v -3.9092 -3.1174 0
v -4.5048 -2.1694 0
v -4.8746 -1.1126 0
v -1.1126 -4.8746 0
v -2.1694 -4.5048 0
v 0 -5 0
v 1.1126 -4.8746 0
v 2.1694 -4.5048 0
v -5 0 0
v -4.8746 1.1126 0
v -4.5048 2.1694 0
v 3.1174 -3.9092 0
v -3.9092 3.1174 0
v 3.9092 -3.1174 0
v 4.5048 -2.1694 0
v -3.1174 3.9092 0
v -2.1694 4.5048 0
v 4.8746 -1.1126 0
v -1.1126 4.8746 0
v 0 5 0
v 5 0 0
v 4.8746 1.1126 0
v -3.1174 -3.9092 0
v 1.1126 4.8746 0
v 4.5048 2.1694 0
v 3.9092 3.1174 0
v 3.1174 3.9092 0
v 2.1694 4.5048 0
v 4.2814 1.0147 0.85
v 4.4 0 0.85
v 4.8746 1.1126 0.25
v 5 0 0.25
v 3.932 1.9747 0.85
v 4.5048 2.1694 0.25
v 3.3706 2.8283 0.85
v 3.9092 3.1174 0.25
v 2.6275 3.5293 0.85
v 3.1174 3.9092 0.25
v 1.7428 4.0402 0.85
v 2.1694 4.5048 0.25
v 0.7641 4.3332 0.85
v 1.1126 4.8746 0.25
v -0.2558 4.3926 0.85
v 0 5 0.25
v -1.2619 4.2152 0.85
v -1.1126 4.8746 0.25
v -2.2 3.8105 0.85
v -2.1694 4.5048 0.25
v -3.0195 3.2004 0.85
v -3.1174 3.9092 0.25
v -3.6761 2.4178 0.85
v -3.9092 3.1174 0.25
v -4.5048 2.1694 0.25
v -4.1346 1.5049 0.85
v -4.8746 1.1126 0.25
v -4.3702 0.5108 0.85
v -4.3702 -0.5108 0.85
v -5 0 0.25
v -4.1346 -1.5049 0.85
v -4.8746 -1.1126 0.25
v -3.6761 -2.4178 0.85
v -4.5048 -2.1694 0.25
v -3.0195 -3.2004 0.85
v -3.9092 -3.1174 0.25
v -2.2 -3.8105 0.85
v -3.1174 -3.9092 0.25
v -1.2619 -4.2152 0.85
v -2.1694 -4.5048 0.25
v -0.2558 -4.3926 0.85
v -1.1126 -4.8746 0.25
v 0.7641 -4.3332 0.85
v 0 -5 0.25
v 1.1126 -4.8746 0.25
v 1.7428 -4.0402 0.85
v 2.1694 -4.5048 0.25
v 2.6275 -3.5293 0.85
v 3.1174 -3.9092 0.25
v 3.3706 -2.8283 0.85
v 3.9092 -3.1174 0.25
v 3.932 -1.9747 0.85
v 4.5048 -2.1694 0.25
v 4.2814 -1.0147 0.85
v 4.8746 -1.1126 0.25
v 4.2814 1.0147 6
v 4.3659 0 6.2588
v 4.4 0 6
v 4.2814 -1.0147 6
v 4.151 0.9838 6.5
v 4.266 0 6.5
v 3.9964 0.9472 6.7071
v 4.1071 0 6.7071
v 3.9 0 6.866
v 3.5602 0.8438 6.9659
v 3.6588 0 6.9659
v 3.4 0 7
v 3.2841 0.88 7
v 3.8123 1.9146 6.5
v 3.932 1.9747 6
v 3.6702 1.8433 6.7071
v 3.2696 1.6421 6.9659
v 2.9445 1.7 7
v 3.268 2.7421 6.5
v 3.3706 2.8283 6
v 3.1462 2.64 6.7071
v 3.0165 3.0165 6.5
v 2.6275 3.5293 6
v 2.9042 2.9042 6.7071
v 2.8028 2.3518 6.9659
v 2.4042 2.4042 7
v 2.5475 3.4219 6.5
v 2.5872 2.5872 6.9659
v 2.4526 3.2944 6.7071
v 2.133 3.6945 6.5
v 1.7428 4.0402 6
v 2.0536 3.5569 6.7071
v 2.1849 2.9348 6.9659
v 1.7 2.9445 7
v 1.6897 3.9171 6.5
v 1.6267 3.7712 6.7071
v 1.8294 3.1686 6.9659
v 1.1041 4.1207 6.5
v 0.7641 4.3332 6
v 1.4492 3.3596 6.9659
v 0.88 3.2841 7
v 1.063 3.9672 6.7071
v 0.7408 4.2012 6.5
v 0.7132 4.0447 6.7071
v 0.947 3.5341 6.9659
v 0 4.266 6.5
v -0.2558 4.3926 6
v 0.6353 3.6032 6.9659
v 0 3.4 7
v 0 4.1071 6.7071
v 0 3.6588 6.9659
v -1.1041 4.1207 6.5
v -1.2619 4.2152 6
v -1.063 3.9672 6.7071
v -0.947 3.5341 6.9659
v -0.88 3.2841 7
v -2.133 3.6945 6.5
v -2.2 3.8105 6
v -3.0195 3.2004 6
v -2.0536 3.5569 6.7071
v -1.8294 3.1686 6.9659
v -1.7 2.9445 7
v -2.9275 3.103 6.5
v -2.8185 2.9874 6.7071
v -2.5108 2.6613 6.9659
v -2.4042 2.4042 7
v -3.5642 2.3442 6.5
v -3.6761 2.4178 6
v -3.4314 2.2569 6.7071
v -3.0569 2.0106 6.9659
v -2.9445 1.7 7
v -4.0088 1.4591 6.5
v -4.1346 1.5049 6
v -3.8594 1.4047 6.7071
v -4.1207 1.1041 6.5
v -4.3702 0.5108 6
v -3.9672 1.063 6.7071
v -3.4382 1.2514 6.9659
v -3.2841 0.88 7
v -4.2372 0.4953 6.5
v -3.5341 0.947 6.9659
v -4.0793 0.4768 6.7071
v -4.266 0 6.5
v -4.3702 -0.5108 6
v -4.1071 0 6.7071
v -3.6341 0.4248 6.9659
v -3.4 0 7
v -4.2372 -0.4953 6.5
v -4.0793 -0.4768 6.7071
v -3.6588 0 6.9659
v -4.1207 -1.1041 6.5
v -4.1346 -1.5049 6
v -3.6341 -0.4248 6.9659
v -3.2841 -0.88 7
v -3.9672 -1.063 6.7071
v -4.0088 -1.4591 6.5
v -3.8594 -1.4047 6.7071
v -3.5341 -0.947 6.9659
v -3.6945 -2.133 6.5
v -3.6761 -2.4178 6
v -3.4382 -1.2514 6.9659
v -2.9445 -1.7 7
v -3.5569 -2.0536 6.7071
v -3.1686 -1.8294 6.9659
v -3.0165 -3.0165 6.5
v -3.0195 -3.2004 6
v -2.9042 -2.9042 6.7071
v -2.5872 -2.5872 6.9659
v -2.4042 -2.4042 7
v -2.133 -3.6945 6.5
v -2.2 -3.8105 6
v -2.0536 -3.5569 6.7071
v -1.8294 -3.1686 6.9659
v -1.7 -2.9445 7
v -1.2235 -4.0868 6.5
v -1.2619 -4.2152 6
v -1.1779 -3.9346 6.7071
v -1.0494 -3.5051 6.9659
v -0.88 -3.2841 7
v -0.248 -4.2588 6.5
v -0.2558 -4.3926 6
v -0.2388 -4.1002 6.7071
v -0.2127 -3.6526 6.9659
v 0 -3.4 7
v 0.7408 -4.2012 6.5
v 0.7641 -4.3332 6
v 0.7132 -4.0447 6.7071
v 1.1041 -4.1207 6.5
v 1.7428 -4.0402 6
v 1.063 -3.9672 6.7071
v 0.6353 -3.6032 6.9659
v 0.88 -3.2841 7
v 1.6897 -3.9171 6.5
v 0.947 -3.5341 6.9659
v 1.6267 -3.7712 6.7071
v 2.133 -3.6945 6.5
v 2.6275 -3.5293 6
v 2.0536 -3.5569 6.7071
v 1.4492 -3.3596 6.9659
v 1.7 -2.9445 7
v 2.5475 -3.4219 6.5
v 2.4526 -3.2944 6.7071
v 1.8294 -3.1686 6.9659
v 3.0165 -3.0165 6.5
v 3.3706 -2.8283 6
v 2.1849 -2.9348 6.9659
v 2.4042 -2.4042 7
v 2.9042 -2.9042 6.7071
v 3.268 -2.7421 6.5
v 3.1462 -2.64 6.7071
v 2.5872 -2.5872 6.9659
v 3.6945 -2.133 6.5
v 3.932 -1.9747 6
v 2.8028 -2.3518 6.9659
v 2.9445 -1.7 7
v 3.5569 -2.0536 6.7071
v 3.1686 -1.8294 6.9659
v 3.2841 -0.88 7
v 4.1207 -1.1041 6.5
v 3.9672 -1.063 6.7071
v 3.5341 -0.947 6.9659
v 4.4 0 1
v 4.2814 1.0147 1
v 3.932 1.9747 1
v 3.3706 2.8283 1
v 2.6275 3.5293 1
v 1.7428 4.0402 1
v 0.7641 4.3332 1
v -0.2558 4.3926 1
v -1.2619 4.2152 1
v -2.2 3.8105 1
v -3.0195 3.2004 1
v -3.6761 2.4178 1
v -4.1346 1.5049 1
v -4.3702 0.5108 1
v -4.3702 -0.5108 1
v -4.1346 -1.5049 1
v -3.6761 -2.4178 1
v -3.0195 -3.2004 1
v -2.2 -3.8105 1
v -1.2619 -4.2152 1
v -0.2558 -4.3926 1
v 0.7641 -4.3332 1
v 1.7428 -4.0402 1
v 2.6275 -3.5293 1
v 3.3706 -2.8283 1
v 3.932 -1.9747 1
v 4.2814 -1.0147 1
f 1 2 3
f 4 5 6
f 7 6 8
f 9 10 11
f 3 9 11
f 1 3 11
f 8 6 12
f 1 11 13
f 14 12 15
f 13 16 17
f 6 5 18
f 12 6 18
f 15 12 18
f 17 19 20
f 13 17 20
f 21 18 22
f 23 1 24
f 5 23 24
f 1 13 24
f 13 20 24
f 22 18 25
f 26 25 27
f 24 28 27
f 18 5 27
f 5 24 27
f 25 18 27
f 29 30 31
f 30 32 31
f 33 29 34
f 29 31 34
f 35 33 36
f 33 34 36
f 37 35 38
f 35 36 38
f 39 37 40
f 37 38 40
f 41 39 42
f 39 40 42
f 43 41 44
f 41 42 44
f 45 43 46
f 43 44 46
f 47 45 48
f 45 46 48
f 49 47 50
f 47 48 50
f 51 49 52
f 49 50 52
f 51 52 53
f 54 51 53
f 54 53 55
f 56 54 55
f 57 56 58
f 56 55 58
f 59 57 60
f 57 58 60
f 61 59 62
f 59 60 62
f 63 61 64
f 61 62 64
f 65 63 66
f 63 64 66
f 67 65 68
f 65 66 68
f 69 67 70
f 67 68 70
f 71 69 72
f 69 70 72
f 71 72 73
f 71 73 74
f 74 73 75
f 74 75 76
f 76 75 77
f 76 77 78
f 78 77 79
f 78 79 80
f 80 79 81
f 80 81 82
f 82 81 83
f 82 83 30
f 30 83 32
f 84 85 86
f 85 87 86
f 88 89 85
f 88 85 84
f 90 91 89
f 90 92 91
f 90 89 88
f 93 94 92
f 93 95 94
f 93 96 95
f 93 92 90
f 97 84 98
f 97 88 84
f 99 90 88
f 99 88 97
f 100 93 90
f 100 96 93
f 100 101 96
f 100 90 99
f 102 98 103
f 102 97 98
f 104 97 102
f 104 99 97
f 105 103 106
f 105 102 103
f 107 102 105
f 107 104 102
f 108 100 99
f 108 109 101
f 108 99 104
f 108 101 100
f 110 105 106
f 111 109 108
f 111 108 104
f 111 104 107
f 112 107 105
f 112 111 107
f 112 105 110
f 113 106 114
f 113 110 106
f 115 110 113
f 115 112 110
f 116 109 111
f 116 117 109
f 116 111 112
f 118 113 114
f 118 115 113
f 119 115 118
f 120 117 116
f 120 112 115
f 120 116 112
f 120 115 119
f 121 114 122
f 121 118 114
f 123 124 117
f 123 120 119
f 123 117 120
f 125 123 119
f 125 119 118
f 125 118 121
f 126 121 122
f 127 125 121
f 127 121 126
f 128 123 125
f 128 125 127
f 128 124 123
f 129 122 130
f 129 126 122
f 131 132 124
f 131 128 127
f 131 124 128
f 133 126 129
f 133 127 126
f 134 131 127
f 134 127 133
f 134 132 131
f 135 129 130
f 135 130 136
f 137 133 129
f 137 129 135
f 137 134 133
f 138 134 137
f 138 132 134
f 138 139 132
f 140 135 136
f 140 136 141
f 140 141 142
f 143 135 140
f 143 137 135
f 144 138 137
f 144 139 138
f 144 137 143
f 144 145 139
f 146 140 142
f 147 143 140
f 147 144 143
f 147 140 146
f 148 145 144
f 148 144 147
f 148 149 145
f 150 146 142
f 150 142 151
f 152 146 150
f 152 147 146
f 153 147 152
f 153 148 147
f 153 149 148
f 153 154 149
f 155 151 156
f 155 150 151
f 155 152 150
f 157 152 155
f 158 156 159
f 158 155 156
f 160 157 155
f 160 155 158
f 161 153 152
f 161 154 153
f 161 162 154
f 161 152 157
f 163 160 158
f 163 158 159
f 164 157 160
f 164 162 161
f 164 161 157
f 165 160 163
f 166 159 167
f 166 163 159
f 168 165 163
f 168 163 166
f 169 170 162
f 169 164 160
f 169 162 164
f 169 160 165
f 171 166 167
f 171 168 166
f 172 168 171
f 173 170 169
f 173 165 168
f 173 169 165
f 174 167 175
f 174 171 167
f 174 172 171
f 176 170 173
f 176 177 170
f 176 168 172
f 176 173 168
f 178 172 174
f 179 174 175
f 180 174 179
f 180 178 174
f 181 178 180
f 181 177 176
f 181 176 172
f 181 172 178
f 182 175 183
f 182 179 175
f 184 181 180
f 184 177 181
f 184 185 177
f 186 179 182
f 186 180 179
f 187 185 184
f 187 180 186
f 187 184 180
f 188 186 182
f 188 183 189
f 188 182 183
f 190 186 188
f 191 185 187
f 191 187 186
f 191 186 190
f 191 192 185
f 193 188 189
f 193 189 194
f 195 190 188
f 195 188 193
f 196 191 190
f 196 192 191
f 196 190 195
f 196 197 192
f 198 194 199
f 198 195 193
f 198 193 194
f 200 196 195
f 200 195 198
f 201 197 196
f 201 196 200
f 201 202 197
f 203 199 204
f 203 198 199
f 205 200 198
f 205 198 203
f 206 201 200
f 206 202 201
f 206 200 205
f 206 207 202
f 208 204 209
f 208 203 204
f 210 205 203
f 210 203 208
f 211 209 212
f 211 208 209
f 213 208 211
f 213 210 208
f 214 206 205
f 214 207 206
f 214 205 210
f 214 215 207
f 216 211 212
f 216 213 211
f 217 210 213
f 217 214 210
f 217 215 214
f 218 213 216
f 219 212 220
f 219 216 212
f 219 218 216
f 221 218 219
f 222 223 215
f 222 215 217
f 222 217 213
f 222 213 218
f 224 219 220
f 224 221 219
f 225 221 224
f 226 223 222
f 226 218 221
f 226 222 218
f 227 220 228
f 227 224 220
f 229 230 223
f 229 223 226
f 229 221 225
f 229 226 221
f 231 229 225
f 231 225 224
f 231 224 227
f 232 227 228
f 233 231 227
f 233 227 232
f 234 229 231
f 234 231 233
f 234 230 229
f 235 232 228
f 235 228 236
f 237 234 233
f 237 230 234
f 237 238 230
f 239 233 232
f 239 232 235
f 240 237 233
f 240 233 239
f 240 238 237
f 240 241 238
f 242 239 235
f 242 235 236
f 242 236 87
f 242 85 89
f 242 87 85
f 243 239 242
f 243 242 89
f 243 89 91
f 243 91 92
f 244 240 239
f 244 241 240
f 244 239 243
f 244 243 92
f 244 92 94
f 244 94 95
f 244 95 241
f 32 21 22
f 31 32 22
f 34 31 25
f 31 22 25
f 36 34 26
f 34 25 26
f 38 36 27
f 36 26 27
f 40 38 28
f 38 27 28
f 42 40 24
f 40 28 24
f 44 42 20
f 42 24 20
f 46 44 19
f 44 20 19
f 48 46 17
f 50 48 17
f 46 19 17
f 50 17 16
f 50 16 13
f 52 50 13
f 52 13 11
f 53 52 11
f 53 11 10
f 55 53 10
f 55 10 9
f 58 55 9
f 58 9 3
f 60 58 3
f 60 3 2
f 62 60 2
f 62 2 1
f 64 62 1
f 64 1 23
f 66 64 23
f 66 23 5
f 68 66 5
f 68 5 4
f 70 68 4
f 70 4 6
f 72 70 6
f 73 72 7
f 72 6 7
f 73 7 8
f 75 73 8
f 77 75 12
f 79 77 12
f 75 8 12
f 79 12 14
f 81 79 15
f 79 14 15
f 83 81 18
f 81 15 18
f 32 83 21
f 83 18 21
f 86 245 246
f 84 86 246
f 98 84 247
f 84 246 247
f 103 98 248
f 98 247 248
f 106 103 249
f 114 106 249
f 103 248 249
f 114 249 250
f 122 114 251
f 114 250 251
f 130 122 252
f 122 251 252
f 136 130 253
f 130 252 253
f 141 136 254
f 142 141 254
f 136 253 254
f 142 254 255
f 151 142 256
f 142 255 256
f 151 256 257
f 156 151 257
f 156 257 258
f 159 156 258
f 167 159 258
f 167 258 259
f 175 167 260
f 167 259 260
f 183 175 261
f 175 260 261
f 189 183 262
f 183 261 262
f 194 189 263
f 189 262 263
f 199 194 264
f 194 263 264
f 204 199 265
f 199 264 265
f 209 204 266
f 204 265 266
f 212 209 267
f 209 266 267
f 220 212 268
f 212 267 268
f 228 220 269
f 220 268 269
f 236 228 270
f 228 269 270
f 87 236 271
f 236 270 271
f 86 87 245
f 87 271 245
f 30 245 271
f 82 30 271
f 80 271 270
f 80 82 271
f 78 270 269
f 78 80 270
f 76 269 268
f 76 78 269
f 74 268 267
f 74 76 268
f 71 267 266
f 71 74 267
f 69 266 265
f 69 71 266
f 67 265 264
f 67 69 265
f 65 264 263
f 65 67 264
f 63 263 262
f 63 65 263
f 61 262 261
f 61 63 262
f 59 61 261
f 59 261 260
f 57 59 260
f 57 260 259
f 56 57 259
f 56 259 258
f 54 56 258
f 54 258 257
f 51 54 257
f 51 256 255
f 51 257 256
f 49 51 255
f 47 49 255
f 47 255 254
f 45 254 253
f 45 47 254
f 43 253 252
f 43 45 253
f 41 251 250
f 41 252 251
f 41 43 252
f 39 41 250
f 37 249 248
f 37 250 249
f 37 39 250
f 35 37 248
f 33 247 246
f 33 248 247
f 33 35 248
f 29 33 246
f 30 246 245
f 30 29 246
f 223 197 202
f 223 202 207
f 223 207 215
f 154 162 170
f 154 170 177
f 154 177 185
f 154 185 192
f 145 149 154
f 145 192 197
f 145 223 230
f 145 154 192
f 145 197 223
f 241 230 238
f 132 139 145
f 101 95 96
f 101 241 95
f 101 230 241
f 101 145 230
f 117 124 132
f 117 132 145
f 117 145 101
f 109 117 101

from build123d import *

# Parameters (mm, degrees)
SKETCH1_R           = 5
BOSS_EXTRUDE1_DEPTH = 1
SKETCH2_R           = 4.4
BOSS_EXTRUDE2_DEPTH = 6
FILLET2_R           = 1
CHAMFER1_SIZE       = 0.75


with BuildPart() as part:
    # Sketch1 → Boss-Extrude1 (new body)
    with BuildSketch(Plane.XY):
        Circle(SKETCH1_R)
    extrude(amount=BOSS_EXTRUDE1_DEPTH)

    # Sketch2 → Boss-Extrude2 (add)
    with BuildSketch(Plane.XY.offset(1)):
        Circle(SKETCH2_R)
    extrude(amount=BOSS_EXTRUDE2_DEPTH)

    # Fillet2
    fillet2_edges = [part.edges().sort_by_distance(p)[0] for p in [
        (-4.4, 0, 7),
    ]]
    fillet(fillet2_edges, radius=FILLET2_R)

    # Chamfer1
    # the kernel refuses this chamfer: 0.75 mm, written as the material it takes off along each edge
    with BuildSketch(Plane(origin=(0, 0, 1), x_dir=(1, 0, 0), z_dir=(0, -1, 0))) as chamfer1_piece_1_section:
        Polygon((5 - CHAMFER1_SIZE, 0), (5, -CHAMFER1_SIZE), (5, 0), align=None)
    chamfer1_piece_1 = revolve(axis=Axis((0, 0, 1), (0, 0, 1)), mode=Mode.PRIVATE)
    chamfer1_piece_1 = chamfer1_piece_1 - Plane(origin=(0, 0, 0.553993393), x_dir=(1, 0, 0), z_dir=(0, 0, -1)) * Cylinder(4.4, 20, mode=Mode.PRIVATE)
    add(chamfer1_piece_1, mode=Mode.SUBTRACT)


solid = part.part
